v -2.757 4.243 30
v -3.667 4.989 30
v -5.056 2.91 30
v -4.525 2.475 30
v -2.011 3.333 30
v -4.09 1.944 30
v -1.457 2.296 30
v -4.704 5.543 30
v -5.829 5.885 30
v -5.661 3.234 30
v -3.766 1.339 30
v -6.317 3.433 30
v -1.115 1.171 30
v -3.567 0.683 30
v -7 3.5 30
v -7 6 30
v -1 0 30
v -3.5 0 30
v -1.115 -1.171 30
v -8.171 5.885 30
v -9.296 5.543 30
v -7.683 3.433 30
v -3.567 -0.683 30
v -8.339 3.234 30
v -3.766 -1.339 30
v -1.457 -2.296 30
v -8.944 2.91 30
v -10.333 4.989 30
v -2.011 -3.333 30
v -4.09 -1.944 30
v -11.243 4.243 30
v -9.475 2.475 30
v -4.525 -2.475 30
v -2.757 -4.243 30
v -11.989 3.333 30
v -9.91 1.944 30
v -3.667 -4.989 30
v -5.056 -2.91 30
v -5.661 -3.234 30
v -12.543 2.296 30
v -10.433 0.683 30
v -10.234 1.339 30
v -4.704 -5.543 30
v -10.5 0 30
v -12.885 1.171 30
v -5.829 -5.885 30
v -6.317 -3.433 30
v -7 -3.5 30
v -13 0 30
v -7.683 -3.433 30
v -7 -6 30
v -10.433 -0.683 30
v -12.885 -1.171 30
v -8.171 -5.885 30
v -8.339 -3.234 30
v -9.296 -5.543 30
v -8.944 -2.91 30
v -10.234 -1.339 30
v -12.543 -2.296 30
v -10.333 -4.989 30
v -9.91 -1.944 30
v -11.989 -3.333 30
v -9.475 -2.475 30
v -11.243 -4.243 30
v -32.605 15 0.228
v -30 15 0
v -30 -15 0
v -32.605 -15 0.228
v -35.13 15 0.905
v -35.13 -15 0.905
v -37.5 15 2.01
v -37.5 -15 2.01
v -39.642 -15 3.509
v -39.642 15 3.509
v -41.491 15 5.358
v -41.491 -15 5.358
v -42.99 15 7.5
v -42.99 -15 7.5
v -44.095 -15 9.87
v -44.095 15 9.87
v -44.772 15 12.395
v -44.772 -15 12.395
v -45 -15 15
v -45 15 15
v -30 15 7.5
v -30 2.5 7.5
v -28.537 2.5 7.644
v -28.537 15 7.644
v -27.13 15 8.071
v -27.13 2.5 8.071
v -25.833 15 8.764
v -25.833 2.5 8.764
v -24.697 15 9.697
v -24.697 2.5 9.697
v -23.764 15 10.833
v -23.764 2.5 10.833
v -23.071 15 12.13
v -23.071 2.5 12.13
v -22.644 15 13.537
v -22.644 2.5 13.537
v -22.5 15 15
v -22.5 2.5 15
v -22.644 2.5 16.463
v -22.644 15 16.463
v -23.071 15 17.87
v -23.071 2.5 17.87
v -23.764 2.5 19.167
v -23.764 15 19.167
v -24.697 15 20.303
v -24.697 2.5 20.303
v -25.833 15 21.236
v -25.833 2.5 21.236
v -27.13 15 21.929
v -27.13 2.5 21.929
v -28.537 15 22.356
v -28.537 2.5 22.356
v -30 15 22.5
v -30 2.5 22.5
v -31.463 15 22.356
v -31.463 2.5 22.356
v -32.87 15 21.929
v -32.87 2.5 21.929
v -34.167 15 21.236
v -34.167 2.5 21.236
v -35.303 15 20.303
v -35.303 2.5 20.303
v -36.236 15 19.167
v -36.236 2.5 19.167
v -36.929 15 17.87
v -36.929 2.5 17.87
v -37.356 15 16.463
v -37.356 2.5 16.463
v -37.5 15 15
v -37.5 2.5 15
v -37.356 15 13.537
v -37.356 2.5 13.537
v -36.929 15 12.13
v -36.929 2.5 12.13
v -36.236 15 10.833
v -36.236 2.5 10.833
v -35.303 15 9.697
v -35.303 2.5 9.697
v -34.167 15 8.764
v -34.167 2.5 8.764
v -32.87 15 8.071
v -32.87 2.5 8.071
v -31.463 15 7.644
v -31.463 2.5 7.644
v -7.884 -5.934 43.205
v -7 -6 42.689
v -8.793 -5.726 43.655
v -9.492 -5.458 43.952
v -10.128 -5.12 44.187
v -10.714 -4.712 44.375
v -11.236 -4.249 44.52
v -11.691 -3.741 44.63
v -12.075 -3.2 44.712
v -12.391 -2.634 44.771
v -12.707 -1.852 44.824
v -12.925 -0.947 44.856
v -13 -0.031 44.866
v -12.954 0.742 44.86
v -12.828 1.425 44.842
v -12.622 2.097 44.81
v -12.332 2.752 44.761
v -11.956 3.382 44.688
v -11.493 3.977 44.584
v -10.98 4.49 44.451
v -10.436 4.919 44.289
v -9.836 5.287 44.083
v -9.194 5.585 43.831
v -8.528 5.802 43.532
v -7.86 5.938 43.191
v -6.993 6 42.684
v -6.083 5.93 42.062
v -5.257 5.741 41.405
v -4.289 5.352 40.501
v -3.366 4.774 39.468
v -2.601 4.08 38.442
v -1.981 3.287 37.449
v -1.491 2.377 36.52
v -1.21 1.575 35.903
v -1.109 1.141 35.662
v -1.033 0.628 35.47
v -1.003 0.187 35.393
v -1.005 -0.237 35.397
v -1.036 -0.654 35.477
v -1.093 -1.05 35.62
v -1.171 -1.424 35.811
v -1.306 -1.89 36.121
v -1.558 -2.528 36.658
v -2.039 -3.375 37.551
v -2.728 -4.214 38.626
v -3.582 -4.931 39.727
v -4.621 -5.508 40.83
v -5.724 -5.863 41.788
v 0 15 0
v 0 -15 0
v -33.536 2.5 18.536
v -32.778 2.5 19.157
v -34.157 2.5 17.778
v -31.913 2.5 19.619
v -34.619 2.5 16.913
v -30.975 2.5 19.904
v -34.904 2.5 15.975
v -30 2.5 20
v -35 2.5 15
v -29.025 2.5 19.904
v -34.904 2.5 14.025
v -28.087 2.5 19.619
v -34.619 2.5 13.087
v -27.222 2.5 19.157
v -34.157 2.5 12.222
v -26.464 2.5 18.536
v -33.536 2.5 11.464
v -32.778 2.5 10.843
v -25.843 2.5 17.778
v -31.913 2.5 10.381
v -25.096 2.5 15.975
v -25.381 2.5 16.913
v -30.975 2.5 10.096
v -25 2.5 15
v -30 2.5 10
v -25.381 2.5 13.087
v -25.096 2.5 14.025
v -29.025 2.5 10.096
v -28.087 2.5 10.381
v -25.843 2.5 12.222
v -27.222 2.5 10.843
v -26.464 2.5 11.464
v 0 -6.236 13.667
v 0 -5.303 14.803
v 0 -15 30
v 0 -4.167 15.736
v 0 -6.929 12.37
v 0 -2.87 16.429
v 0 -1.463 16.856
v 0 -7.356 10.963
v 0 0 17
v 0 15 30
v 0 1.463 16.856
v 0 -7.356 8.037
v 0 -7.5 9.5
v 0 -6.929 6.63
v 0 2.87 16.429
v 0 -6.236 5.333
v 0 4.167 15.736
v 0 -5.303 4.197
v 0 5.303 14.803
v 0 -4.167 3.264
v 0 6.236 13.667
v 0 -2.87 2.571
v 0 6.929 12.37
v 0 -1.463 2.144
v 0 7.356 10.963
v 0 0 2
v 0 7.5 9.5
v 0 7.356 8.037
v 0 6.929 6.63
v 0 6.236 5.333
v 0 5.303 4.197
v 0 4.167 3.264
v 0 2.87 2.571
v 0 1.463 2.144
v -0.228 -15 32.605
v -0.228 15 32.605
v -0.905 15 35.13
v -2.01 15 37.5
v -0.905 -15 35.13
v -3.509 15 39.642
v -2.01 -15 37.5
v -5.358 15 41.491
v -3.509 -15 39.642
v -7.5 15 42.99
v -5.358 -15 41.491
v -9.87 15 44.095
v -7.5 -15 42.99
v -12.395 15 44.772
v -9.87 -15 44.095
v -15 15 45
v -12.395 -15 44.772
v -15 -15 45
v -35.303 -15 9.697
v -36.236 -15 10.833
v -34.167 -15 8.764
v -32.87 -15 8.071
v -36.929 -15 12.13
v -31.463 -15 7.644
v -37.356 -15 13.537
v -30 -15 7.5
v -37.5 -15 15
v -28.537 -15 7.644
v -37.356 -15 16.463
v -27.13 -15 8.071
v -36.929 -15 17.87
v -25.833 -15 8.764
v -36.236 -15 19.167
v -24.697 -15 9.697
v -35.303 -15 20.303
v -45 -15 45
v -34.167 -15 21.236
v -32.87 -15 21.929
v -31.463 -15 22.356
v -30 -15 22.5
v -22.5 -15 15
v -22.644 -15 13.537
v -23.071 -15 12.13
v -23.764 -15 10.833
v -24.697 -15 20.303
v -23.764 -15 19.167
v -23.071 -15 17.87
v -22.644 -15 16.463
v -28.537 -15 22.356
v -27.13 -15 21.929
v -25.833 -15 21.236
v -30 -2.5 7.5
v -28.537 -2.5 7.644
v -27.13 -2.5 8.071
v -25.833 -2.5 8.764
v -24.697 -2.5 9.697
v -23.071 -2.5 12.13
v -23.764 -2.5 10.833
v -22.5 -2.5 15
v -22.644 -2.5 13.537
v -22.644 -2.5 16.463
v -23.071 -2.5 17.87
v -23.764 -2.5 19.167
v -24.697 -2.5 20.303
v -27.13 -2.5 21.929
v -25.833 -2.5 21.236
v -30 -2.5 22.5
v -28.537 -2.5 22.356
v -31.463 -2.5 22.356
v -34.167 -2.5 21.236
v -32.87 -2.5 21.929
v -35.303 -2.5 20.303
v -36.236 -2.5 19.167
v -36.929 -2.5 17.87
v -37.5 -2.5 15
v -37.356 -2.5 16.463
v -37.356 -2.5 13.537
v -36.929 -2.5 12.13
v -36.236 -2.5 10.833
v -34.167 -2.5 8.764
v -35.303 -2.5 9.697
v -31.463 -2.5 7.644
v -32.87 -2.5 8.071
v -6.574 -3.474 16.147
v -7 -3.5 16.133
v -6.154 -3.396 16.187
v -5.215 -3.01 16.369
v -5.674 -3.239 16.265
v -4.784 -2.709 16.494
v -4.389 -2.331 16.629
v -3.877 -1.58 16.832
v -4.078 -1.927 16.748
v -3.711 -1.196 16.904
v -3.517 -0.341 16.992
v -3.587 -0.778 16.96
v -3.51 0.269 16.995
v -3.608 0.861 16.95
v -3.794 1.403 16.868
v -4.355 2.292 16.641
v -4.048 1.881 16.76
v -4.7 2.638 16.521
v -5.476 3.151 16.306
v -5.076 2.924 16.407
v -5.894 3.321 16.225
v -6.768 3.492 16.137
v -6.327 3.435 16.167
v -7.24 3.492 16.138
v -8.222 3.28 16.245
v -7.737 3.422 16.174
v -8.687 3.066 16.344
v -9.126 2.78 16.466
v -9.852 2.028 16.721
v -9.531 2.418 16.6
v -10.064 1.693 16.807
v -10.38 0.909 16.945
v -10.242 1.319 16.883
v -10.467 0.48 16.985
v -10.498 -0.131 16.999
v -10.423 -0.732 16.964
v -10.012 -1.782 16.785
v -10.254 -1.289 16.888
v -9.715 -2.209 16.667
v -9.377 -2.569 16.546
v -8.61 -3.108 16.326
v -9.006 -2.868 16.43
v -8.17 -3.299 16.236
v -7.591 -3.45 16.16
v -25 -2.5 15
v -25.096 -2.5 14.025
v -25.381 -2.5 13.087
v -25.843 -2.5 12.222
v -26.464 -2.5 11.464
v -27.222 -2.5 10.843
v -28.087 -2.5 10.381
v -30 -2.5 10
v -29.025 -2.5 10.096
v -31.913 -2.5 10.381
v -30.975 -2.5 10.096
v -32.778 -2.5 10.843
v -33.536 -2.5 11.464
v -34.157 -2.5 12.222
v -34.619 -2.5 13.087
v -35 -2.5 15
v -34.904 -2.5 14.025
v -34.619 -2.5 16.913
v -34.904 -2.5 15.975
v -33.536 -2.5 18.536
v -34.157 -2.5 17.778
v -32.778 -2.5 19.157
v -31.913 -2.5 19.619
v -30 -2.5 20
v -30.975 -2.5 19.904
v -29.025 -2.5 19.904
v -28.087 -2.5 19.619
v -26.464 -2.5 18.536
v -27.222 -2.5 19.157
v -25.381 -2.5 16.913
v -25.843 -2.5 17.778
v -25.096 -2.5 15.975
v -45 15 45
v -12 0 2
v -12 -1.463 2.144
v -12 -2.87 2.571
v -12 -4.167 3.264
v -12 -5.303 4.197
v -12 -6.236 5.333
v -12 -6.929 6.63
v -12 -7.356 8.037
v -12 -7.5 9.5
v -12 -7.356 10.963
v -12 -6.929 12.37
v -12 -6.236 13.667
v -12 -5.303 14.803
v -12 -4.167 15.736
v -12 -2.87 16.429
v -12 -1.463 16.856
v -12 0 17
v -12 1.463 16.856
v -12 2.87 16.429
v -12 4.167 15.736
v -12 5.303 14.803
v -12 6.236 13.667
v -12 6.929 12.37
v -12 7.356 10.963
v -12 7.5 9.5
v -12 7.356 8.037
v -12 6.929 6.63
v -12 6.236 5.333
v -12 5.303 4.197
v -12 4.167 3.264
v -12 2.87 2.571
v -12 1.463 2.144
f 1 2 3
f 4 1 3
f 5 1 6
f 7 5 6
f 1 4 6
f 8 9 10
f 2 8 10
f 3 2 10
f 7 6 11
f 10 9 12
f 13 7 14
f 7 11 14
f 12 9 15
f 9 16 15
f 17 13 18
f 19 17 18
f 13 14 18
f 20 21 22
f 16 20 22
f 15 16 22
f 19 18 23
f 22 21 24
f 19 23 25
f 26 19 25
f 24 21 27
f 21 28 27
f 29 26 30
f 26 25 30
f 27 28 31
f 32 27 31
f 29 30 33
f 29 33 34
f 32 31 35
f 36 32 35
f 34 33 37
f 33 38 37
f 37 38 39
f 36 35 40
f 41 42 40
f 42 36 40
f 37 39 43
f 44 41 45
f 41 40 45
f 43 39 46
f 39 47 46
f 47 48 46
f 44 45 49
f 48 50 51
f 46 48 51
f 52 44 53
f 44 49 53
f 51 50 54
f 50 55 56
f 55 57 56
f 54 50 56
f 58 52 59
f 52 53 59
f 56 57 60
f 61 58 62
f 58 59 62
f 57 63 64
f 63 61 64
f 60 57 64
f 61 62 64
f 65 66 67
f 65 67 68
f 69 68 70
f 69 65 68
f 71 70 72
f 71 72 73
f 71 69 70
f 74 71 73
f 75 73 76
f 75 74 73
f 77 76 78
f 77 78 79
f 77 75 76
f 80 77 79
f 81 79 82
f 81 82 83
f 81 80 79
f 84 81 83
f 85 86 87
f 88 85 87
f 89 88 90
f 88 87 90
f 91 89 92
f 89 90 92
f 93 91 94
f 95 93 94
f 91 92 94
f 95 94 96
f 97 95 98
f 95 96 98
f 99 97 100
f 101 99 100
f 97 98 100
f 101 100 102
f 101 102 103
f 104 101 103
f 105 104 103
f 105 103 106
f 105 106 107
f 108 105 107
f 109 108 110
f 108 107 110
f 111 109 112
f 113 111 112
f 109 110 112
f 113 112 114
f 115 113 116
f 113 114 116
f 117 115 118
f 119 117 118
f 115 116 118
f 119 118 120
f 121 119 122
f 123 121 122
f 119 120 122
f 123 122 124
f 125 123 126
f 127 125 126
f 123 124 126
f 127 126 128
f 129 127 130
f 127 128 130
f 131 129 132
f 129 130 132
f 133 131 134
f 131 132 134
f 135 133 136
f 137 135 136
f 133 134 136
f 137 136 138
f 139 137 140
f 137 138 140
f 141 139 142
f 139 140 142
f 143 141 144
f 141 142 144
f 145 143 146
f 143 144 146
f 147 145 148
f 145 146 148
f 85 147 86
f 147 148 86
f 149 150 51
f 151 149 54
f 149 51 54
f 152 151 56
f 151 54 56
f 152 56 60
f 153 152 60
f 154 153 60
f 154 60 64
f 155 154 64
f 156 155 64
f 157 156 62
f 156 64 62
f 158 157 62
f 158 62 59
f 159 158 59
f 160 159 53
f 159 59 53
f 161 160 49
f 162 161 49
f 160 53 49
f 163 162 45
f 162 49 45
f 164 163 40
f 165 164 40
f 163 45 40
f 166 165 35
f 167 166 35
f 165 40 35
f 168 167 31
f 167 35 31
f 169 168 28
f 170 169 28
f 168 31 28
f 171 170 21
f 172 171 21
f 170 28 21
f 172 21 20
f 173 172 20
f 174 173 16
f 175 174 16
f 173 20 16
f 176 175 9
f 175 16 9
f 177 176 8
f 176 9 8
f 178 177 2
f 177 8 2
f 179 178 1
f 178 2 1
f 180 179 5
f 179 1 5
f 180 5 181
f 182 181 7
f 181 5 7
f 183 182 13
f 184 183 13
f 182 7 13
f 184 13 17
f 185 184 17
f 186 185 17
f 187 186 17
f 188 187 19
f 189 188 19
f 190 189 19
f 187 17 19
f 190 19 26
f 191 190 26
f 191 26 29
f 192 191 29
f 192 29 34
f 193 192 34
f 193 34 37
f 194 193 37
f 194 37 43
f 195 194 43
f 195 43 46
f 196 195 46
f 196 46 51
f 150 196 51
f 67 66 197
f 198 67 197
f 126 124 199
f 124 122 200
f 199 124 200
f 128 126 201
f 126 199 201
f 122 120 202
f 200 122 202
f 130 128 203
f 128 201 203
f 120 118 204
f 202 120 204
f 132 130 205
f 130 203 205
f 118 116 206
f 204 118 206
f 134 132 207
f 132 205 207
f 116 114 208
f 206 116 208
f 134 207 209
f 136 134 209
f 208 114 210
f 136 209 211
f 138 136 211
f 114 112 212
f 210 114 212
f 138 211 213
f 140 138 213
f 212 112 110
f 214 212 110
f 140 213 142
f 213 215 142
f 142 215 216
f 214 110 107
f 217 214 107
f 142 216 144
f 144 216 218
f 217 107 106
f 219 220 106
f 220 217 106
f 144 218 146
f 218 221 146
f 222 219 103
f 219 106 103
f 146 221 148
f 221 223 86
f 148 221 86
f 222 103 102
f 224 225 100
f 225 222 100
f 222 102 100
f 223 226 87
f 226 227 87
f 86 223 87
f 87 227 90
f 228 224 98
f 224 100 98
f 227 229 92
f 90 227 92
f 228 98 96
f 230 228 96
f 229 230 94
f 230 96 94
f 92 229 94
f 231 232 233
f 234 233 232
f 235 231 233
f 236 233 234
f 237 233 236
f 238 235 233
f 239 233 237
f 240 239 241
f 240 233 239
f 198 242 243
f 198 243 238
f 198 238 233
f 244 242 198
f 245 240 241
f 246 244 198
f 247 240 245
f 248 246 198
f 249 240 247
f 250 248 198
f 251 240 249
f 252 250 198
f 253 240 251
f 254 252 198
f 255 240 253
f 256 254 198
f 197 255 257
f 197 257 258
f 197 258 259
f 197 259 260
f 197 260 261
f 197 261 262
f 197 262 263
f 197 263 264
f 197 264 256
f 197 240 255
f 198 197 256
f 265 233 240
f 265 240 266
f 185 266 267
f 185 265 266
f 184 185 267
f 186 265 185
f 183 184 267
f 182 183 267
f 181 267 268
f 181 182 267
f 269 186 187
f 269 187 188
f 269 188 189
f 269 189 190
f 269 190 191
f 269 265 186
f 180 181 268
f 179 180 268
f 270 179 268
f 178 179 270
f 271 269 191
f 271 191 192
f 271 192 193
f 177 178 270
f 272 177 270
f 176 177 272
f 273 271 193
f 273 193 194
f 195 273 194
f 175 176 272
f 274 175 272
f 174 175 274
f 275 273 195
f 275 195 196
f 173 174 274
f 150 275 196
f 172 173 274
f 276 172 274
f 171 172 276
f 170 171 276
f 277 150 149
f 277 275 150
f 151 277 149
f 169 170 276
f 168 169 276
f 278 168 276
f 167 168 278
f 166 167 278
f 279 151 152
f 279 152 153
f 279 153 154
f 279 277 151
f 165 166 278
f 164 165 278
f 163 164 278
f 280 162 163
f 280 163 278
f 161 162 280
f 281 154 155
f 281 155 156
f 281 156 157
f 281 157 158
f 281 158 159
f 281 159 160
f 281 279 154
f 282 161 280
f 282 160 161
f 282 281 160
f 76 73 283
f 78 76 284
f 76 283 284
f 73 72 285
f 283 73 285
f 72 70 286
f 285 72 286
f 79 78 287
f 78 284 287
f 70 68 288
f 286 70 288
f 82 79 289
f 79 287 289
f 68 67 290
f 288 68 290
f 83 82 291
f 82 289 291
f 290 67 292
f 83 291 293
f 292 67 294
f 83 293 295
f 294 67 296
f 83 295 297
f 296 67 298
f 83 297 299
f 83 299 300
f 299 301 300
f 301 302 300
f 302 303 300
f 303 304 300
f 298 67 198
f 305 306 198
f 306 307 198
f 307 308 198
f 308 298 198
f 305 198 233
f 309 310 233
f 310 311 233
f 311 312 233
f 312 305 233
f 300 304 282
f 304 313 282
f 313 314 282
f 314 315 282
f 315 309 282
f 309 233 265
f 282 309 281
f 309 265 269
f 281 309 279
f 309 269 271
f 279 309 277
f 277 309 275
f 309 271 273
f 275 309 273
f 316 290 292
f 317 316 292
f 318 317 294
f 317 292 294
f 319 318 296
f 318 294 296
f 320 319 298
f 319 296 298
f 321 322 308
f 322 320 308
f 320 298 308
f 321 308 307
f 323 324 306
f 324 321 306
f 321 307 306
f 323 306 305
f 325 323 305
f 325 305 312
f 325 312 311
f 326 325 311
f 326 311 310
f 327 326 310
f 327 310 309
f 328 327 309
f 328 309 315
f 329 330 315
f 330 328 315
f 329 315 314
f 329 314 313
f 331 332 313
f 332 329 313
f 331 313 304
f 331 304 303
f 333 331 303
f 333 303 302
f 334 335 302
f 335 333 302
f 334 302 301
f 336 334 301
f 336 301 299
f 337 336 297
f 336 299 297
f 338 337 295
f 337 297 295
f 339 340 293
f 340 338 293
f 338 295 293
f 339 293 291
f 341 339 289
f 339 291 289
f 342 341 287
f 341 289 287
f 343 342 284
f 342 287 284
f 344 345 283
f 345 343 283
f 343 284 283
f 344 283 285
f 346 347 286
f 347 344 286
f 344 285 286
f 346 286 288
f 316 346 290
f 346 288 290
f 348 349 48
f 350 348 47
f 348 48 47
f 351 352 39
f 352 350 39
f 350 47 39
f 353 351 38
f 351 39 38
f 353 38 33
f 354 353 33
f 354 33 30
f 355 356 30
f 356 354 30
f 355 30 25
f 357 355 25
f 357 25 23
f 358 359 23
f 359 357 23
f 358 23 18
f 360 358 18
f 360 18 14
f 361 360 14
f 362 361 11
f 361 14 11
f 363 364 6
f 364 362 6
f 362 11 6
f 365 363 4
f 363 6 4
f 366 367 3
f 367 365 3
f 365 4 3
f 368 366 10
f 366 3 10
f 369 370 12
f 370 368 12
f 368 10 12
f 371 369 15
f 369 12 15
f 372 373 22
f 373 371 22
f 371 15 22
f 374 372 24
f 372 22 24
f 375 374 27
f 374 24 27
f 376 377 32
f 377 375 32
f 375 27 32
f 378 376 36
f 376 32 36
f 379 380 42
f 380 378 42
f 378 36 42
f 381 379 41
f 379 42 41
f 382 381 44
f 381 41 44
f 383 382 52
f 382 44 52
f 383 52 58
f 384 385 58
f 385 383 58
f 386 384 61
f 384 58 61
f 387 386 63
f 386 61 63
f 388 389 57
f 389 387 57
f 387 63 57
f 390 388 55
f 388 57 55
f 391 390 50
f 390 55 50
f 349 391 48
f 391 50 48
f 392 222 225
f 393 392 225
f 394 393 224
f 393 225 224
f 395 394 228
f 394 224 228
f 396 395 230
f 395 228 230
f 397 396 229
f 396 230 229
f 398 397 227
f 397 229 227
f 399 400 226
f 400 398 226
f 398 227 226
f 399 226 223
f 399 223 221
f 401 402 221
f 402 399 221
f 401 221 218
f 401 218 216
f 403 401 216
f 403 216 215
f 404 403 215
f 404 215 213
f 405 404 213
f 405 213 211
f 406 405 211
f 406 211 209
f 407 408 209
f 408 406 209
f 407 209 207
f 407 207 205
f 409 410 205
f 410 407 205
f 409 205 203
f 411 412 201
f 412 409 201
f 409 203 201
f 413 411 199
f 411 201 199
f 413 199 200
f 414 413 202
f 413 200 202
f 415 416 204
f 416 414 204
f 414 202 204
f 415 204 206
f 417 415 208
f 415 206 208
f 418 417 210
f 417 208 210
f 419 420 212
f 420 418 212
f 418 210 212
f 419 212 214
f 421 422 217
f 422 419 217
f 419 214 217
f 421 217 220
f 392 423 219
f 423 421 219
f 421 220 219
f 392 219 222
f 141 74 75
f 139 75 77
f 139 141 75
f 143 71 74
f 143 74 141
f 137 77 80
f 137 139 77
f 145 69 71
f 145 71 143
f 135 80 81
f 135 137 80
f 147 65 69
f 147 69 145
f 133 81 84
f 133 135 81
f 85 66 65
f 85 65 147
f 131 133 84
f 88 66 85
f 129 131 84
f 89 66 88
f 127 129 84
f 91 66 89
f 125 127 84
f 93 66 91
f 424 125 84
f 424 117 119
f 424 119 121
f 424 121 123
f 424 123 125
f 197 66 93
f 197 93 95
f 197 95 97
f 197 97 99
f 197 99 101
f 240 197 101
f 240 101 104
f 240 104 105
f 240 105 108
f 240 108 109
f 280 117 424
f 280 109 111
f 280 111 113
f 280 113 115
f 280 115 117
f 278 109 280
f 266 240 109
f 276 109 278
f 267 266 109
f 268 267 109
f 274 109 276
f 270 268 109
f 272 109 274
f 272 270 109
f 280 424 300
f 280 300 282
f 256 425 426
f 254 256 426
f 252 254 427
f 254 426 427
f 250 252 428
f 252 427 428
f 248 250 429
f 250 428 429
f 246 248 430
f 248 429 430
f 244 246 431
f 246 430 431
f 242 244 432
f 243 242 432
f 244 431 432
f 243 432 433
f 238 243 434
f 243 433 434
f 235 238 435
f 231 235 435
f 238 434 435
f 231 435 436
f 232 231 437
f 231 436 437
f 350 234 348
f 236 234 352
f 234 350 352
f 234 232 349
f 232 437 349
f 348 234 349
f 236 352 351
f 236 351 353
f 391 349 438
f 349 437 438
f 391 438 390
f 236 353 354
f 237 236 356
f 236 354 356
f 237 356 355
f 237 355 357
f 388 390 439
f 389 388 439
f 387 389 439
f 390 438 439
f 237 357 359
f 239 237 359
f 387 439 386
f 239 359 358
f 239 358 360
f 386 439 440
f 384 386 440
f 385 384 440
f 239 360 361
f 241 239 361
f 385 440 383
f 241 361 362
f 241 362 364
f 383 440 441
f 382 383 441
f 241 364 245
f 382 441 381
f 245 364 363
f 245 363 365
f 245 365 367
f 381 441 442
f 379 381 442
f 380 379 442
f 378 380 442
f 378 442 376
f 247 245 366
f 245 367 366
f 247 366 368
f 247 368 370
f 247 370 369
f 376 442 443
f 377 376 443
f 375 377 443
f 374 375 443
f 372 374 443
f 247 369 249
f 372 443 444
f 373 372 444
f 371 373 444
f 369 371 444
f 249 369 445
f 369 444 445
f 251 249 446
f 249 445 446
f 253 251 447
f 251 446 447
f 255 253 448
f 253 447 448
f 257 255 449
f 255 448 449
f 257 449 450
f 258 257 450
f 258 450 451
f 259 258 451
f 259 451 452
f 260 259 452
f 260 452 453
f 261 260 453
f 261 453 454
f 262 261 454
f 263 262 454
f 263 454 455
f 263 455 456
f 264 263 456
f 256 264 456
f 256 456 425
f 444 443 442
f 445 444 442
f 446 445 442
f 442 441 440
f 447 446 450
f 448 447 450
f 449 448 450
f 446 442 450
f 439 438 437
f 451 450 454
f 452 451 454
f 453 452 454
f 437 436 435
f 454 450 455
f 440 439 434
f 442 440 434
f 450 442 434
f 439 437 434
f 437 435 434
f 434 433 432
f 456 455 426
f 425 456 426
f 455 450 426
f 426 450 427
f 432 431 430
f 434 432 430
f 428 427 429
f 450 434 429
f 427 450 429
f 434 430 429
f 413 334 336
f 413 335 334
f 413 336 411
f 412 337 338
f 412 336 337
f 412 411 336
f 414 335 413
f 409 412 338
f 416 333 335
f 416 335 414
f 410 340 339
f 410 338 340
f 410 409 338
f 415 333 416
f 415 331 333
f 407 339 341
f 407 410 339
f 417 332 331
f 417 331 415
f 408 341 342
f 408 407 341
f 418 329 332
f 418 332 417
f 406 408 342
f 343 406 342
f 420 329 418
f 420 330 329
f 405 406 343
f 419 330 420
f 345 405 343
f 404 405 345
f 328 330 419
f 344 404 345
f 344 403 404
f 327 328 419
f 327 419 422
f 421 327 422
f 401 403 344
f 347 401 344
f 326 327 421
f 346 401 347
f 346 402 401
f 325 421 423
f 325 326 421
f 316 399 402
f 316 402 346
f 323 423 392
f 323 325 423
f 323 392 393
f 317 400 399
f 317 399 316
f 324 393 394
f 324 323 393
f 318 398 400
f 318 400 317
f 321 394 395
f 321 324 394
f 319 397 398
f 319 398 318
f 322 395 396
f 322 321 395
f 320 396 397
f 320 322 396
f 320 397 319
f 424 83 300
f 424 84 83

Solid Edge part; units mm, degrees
sketch "Sketch1" plane through (0, 0, 0) normal (0, -1, 0) x (1, 0, 0)
  line L0 (-45, 15) -> (-45, 45)
  line L1 (-45, 45) -> (0, 45)
  line L2 (0, 45) -> (0, 0)
  line L3 (-30, 0) -> (0, 0)
  arc A0 (-30, 0) -> (-45, 15) centre (-30, 15) cw
extrude "ExtrudedProtrusion_1" add sketch "Sketch1" along normal mid plane 30
hole "Hole_1" at (-7, 0, 45) direction (0, 0, -1) diameter 12 depth 15
hole "Hole_2" at (0, 0, 9.5) direction (-1, 0, 0) diameter 15 depth 12
hole "Hole_3" at (-7, 0, 30) direction (0, 0, -1) diameter 7 end up to next
fillet "Round_1" radius 15 1 edges at (0, 0, 45)
hole "Hole_4" at (-30, -15, 15) direction (0, 1, 0) diameter 15 end up to next
sketch "Sketch2" plane through (0, 0, 0) normal (0, -1, 0) x (1, 0, 0)
  circle A0 centre (-30, 15) radius 7.5
  circle A1 centre (-30, 15) radius 5
extrude "ExtrudedProtrusion_2" add sketch "Sketch2" along normal mid plane 5
